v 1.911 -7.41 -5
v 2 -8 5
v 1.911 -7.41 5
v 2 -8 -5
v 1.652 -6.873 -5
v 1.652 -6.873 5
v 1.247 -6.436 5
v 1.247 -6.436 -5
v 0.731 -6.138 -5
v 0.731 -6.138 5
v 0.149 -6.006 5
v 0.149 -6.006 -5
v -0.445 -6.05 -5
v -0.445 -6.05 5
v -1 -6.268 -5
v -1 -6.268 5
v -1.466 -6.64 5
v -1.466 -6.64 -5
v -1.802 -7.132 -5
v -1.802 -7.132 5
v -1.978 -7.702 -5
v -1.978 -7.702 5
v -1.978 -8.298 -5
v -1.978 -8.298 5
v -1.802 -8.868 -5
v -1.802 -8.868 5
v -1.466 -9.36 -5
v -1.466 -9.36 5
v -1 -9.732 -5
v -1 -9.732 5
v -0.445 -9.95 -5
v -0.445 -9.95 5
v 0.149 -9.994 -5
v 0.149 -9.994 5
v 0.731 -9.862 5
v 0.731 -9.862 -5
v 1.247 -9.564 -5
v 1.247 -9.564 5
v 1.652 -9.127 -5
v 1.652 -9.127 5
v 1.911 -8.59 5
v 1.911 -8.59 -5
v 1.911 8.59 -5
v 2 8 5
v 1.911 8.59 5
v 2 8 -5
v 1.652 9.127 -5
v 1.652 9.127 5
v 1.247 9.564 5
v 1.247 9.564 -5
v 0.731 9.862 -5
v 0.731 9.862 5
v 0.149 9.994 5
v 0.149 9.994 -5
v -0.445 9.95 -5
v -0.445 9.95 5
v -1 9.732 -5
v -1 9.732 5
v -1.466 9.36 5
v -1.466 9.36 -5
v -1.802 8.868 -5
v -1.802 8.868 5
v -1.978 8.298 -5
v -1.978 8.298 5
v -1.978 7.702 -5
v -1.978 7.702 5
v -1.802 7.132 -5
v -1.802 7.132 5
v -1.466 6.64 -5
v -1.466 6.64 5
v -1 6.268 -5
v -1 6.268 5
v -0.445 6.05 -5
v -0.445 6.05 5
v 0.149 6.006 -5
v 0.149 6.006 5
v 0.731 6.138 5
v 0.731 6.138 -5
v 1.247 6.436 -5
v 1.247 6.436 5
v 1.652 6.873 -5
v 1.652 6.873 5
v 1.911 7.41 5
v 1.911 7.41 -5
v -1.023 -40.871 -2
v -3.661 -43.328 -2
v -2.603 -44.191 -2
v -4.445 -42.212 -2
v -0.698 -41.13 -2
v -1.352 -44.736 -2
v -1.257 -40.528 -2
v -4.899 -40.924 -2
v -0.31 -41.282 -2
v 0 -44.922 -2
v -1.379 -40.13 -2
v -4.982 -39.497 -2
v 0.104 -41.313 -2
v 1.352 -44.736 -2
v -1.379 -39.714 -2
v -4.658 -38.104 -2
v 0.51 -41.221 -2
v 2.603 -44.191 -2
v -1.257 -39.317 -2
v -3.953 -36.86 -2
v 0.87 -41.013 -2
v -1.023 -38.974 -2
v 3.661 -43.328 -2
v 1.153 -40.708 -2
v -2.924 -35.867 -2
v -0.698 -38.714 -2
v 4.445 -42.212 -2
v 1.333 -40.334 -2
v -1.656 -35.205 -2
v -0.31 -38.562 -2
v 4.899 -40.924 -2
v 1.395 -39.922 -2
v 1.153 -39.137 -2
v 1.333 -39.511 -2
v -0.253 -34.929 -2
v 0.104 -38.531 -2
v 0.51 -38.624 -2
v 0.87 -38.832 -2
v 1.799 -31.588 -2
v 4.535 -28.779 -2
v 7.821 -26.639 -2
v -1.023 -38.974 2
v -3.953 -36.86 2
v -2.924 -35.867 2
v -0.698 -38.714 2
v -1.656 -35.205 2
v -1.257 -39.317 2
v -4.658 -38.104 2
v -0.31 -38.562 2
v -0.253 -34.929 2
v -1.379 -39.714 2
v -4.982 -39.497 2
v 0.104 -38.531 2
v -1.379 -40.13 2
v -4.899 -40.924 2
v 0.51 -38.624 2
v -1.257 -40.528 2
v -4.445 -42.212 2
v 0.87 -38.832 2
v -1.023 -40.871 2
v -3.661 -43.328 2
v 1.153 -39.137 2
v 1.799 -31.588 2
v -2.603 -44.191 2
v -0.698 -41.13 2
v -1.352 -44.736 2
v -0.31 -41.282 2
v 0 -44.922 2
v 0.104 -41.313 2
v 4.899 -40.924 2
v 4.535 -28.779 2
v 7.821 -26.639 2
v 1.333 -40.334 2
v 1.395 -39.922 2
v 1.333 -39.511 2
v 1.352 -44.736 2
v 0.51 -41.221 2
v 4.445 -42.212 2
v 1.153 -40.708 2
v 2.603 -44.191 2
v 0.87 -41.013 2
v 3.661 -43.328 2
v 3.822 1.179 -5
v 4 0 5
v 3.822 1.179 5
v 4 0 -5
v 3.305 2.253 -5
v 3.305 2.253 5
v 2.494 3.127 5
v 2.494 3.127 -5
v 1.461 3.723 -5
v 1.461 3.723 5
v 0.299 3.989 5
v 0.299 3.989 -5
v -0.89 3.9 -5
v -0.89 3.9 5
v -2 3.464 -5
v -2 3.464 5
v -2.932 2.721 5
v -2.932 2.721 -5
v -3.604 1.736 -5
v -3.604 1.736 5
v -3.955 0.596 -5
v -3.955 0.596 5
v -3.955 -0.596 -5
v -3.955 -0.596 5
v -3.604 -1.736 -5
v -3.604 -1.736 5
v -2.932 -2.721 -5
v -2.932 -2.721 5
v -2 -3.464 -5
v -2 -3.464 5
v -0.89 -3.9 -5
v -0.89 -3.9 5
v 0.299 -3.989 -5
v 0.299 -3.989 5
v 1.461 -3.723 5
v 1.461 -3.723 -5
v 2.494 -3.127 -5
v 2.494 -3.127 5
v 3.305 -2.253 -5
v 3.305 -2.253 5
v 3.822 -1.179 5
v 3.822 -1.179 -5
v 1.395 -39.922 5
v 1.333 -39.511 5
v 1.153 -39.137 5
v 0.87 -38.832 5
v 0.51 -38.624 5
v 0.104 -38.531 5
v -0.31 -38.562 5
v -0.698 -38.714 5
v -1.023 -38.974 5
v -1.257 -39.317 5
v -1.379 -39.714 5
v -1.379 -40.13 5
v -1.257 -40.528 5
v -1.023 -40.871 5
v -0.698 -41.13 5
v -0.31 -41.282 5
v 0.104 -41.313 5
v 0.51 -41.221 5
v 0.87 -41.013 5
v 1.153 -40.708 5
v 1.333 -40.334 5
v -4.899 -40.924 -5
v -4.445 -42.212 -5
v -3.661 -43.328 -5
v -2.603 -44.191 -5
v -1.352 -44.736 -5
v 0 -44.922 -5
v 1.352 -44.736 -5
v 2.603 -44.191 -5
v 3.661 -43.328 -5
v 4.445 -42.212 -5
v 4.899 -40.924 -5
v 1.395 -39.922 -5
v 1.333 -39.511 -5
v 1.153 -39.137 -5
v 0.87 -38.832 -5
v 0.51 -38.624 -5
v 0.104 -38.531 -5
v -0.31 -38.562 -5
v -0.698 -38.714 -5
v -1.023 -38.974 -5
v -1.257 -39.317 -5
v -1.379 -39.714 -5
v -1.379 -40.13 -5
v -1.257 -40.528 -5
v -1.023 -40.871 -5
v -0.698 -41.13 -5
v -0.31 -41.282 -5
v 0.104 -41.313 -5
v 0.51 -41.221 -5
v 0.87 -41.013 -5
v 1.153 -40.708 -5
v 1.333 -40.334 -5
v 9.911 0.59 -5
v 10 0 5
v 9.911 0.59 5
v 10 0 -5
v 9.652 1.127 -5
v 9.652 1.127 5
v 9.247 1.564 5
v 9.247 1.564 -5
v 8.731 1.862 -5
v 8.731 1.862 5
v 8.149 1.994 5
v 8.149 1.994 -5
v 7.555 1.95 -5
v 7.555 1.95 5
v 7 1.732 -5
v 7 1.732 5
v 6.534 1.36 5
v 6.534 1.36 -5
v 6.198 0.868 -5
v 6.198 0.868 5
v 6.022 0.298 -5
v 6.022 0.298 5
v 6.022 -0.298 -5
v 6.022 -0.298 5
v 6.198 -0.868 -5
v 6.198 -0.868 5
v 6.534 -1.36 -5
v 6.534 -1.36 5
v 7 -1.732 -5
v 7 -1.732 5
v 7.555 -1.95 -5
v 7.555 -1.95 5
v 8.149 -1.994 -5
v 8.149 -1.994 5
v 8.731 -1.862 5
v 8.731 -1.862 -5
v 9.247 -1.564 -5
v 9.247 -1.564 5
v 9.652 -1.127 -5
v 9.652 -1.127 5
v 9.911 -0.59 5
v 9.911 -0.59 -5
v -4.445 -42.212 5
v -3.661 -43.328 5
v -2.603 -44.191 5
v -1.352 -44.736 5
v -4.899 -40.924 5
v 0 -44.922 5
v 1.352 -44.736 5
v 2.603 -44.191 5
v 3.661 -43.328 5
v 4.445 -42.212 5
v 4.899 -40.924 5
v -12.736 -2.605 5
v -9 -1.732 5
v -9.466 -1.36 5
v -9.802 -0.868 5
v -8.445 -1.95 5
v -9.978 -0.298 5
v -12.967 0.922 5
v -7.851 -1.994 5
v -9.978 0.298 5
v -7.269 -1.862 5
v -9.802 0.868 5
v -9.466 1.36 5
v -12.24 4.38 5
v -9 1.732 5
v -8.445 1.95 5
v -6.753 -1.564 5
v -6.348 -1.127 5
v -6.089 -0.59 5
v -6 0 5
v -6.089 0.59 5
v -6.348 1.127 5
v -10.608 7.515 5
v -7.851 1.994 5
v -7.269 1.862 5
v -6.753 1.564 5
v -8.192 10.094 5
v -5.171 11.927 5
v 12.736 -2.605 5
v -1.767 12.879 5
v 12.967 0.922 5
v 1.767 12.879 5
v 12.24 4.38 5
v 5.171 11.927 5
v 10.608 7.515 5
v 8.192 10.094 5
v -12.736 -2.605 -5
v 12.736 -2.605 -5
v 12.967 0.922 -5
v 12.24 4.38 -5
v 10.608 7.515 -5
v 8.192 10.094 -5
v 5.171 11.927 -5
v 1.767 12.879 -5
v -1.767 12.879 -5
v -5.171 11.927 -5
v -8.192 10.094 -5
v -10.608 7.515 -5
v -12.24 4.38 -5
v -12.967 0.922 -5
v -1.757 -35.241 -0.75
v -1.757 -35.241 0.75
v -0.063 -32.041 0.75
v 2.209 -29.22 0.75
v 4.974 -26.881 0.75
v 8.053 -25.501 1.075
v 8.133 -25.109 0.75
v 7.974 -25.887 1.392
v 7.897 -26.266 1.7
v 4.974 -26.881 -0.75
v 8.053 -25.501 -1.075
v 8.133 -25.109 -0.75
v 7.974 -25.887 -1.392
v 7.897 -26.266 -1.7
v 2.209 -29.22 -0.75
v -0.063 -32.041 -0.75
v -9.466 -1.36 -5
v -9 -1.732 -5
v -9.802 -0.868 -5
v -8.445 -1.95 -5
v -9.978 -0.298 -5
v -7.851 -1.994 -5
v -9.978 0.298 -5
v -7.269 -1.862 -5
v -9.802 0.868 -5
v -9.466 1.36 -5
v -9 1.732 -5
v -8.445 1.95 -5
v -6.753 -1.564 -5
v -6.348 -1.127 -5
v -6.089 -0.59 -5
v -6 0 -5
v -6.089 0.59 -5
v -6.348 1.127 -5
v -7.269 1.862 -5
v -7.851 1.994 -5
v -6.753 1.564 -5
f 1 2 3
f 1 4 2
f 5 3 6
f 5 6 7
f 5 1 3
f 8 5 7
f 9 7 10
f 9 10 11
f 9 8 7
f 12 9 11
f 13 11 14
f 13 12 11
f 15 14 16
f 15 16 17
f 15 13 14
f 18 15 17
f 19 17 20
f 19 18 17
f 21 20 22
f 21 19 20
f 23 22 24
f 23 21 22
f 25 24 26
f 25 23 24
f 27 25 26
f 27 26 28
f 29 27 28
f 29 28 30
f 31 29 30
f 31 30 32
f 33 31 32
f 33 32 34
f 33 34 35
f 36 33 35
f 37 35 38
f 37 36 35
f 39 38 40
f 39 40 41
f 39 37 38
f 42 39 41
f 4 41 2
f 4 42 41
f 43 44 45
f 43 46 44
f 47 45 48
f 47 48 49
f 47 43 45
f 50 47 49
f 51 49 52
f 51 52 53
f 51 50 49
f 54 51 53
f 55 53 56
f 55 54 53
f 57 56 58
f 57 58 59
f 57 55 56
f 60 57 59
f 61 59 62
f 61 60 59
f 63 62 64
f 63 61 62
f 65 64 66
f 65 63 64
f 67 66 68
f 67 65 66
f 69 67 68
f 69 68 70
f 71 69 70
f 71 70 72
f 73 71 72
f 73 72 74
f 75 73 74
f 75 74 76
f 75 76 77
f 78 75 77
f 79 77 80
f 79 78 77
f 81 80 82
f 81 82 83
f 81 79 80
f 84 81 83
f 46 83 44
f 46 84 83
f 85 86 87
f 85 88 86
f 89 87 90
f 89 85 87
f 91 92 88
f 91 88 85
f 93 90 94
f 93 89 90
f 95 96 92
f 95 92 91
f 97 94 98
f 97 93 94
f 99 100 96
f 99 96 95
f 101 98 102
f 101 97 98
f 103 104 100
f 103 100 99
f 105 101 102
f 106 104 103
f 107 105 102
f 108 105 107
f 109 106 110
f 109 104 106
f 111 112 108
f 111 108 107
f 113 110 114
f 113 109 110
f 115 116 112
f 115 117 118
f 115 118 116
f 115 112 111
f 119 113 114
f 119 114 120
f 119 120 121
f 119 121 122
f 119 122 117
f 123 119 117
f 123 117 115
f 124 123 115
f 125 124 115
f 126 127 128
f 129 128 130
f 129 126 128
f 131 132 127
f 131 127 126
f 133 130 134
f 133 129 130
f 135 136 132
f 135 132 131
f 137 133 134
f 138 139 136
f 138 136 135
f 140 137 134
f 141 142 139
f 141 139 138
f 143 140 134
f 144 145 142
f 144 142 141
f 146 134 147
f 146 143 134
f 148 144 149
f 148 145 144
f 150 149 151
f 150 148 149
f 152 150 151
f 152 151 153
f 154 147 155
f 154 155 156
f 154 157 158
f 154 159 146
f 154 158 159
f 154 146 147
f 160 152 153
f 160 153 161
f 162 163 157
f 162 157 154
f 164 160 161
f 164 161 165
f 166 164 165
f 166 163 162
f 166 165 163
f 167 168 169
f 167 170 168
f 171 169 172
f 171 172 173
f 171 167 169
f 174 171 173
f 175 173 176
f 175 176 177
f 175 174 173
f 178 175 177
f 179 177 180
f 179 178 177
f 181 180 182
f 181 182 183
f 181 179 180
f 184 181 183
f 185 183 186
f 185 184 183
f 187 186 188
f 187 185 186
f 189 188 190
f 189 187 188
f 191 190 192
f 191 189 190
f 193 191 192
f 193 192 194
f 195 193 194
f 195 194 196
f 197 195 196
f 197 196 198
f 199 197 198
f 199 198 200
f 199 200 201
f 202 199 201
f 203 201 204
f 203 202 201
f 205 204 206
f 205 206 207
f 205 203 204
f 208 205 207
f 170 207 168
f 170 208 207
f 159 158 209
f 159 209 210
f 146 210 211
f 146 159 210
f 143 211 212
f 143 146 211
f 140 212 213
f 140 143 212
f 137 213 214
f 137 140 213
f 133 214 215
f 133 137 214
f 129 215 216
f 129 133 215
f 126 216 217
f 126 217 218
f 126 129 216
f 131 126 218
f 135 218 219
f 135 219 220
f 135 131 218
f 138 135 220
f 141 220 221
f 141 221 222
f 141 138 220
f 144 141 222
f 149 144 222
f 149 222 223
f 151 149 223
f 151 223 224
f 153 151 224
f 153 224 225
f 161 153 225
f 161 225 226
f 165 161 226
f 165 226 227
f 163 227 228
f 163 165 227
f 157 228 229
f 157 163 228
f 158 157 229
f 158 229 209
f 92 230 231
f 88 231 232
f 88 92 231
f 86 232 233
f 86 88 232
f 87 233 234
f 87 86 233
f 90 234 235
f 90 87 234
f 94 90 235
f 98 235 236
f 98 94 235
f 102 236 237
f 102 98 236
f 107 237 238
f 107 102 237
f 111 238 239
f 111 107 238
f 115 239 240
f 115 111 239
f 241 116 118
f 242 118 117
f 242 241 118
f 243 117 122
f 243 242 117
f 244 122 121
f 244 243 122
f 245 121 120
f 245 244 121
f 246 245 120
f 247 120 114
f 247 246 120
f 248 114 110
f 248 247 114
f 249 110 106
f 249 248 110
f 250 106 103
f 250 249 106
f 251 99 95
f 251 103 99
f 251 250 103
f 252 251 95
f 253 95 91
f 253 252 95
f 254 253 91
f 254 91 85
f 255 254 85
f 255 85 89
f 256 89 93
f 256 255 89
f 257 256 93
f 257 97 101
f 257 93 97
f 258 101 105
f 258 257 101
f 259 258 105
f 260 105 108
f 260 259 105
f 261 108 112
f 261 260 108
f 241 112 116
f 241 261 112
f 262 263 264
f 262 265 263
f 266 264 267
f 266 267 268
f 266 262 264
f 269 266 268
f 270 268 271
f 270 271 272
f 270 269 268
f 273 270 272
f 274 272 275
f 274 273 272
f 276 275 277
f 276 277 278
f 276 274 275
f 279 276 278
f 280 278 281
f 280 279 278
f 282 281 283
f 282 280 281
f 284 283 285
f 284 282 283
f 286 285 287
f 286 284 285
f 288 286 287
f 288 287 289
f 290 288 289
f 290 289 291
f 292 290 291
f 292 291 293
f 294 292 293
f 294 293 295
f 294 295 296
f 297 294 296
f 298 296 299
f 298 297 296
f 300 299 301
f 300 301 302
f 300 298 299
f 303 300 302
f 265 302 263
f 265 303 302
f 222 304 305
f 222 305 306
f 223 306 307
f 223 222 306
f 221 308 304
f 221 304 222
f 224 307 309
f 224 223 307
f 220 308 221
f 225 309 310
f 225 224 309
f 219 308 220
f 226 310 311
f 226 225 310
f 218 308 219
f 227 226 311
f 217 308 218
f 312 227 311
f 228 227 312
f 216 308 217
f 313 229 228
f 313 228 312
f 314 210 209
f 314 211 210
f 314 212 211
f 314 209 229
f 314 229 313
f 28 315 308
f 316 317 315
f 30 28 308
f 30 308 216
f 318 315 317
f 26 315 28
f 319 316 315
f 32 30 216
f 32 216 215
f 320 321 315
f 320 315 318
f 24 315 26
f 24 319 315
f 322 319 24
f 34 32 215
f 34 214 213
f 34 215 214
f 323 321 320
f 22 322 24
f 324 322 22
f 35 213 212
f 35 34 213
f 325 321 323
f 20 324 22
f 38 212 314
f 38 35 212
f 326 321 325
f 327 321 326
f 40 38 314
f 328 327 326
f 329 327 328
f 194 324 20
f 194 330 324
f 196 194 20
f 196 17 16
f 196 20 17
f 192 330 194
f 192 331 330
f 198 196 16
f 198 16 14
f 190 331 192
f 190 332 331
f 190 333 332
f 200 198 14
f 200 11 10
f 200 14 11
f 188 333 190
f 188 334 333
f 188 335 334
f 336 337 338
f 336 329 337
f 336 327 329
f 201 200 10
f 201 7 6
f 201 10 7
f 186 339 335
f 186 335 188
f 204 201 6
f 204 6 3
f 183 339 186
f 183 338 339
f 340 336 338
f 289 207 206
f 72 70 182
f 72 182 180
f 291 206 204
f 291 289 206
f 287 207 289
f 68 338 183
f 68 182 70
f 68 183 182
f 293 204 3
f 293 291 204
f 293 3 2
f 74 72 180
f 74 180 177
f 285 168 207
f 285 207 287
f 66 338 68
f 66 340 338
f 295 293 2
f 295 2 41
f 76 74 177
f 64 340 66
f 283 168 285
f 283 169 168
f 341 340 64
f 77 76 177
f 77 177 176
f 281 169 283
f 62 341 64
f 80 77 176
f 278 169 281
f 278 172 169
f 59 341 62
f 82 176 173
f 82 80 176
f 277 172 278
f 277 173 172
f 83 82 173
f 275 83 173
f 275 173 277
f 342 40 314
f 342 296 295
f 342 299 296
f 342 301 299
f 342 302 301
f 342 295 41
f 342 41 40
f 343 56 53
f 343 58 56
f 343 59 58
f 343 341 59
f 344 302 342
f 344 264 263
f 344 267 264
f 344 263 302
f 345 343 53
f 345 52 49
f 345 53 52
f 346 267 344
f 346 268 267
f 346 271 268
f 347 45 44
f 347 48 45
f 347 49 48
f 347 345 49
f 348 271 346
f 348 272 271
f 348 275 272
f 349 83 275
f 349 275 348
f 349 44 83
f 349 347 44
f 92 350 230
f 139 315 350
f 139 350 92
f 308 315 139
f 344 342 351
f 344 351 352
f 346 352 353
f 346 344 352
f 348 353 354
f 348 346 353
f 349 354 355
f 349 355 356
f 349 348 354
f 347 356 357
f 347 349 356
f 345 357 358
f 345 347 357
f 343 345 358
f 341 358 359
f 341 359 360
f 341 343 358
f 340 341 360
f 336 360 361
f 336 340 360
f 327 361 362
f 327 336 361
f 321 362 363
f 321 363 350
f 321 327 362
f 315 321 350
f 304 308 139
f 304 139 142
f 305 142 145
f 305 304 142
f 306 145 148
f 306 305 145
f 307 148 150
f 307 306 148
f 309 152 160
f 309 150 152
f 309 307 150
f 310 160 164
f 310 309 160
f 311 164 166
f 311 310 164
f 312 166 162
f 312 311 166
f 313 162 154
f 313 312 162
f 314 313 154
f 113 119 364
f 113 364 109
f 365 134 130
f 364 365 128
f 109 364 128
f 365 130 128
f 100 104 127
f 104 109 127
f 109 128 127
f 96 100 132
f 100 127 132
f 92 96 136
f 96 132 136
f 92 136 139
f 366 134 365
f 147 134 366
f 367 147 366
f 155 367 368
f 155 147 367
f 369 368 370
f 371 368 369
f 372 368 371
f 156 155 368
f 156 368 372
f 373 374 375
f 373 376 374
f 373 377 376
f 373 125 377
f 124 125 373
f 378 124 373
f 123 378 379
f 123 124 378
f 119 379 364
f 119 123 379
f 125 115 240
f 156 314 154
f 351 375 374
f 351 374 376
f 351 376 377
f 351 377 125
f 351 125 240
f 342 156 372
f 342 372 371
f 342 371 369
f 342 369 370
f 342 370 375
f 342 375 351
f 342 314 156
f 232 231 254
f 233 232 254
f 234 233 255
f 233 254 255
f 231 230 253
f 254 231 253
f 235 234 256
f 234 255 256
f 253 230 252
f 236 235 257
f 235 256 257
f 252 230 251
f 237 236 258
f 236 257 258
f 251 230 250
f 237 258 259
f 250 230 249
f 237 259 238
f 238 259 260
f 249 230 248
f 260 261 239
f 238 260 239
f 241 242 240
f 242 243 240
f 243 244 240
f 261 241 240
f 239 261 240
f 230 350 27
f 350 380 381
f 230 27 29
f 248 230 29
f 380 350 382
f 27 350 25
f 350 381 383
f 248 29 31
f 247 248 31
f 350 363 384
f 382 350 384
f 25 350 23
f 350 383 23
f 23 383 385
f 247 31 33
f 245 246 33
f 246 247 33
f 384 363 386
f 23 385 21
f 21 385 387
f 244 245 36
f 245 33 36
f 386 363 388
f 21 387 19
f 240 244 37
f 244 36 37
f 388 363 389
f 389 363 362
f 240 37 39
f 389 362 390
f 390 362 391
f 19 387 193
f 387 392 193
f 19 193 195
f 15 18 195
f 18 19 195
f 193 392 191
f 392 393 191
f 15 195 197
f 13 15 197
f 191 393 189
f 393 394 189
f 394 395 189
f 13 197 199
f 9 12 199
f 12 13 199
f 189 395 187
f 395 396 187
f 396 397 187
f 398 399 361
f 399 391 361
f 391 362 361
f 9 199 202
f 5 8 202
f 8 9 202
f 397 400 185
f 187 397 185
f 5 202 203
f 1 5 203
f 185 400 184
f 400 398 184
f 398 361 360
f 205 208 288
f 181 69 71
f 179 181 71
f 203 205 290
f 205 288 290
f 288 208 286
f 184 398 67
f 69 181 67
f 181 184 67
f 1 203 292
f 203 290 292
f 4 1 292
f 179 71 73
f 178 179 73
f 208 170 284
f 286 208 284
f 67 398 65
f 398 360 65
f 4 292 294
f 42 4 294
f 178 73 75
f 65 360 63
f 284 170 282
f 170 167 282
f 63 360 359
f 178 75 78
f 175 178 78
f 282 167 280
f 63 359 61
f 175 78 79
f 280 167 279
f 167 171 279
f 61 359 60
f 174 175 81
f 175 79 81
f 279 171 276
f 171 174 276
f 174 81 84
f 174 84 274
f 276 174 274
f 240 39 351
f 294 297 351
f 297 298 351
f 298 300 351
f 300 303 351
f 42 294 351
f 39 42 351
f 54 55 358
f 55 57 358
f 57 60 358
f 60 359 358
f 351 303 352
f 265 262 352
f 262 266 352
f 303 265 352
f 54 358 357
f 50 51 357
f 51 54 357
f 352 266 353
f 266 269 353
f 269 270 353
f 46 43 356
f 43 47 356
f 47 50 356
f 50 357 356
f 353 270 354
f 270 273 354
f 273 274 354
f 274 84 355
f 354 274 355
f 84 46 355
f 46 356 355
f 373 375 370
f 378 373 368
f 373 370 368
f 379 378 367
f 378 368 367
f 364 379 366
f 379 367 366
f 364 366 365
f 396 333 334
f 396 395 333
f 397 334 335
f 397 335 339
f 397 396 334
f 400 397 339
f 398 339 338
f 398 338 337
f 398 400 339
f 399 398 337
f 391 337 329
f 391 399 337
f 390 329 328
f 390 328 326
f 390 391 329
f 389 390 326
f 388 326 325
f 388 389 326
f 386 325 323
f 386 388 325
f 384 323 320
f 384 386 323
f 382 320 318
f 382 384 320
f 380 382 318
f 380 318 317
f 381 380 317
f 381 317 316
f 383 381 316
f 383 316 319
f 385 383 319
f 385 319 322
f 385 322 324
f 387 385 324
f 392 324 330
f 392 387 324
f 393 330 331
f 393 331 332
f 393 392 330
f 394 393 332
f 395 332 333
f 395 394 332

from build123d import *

# Parameters (mm, degrees)
SKETCH1_R                       = 4
SKETCH1_R_2                     = 2
SKETCH1_R_3                     = 1.395
BOSS_EXTRUDE1_DEPTH             = 5
SKETCH2_R                       = 5
BOSS_EXTRUDE2_DEPTH             = 2
BOSS_EXTRUDE3_REACH             = 7
SKETCH3_R                       = 19
BOSS_EXTRUDE3_DIRECTION_2_REACH = 7
CHAMFER1_SIZE                   = 1.25


with BuildPart() as part:
    # Sketch1 → Boss-Extrude1 (new body, symmetric)
    with BuildSketch(Plane.XY):
        with BuildLine():
            Line((4.898582231, -40.924328172), (12.736313801, -2.605054848))
            ThreePointArc((12.736313801, -2.605054848), (0, 13), (-12.736313801, -2.605054848))
            Line((-12.736313801, -2.605054848), (-4.898582231, -40.924328172))
            ThreePointArc((-4.898582231, -40.924328172), (0, -44.922384), (4.898582231, -40.924328172))
        make_face()
        Circle(SKETCH1_R, mode=Mode.SUBTRACT)
        with Locations((0, 8)):
            Circle(SKETCH1_R_2, mode=Mode.SUBTRACT)
        with Locations((8, 0)):
            Circle(SKETCH1_R_2, mode=Mode.SUBTRACT)
        with Locations((0, -8)):
            Circle(SKETCH1_R_2, mode=Mode.SUBTRACT)
        with Locations((-8, 0)):
            Circle(SKETCH1_R_2, mode=Mode.SUBTRACT)
        with Locations((0, -39.922384)):
            Circle(SKETCH1_R_3, mode=Mode.SUBTRACT)
    extrude(amount=BOSS_EXTRUDE1_DEPTH, both=True)


with BuildPart() as body_2:
    # Sketch2 → Boss-Extrude2 (new body, symmetric)
    with BuildSketch(Plane.XY):
        with Locations((0, -39.922384)):
            Circle(SKETCH2_R)
    extrude(amount=BOSS_EXTRUDE2_DEPTH, both=True)


with BuildPart() as part_1:
    add(part.part)

    # Combine1: cut body 2
    add(body_2.part, mode=Mode.SUBTRACT)


with BuildPart() as body_2_2:

    # Boss-Extrude3: up to this face of the body (flat: up to its plane)
    boss_extrude3_end = Plane(part_1.part.faces().sort_by_distance((0, -35.063805356, 2))[0])
    # Sketch3 → Boss-Extrude3 (new body, up to the picked face)
    with BuildSketch(Plane.XY, mode=Mode.PRIVATE) as boss_extrude3_sk1:
        with Locations((15.804791675, -42.49169824)):
            Circle(SKETCH3_R)
    boss_extrude3_tool1 = split(extrude(boss_extrude3_sk1.sketch, amount=BOSS_EXTRUDE3_REACH, mode=Mode.PRIVATE), bisect_by=boss_extrude3_end, keep=Keep.BOTH, mode=Mode.PRIVATE)
    add(boss_extrude3_tool1.solids().sort_by_distance((15.804792, -42.491698, 0))[0])


    # Boss-Extrude3 direction 2: up to this face of the body (flat: up to its plane)
    boss_extrude3_direction_2_end = Plane(part_1.part.faces().sort_by_distance((0, -35.063805356, -2))[0])
    # Sketch3 → Boss-Extrude3 direction 2 (add, up to the picked face)
    with BuildSketch(Plane.XY, mode=Mode.PRIVATE) as boss_extrude3_direction_2_sk1:
        with Locations((15.804791675, -42.49169824)):
            Circle(SKETCH3_R)
    boss_extrude3_direction_2_tool1 = split(extrude(boss_extrude3_direction_2_sk1.sketch, amount=-BOSS_EXTRUDE3_DIRECTION_2_REACH, mode=Mode.PRIVATE), bisect_by=boss_extrude3_direction_2_end, keep=Keep.BOTH, mode=Mode.PRIVATE)
    add(boss_extrude3_direction_2_tool1.solids().sort_by_distance((15.804792, -42.491698, 0))[0])

    # Chamfer1
    chamfer1_edges = [body_2_2.edges().sort_by_distance(p)[0] for p in [
        (-3.195208325, -42.49169824, -2),
        (-3.195208325, -42.49169824, 2),
    ]]
    chamfer(chamfer1_edges, length=CHAMFER1_SIZE)


with BuildPart() as part_2:
    add(part_1.part)

    # Combine2: cut body 2 2
    add(body_2_2.part, mode=Mode.SUBTRACT)


solid = part_2.part
